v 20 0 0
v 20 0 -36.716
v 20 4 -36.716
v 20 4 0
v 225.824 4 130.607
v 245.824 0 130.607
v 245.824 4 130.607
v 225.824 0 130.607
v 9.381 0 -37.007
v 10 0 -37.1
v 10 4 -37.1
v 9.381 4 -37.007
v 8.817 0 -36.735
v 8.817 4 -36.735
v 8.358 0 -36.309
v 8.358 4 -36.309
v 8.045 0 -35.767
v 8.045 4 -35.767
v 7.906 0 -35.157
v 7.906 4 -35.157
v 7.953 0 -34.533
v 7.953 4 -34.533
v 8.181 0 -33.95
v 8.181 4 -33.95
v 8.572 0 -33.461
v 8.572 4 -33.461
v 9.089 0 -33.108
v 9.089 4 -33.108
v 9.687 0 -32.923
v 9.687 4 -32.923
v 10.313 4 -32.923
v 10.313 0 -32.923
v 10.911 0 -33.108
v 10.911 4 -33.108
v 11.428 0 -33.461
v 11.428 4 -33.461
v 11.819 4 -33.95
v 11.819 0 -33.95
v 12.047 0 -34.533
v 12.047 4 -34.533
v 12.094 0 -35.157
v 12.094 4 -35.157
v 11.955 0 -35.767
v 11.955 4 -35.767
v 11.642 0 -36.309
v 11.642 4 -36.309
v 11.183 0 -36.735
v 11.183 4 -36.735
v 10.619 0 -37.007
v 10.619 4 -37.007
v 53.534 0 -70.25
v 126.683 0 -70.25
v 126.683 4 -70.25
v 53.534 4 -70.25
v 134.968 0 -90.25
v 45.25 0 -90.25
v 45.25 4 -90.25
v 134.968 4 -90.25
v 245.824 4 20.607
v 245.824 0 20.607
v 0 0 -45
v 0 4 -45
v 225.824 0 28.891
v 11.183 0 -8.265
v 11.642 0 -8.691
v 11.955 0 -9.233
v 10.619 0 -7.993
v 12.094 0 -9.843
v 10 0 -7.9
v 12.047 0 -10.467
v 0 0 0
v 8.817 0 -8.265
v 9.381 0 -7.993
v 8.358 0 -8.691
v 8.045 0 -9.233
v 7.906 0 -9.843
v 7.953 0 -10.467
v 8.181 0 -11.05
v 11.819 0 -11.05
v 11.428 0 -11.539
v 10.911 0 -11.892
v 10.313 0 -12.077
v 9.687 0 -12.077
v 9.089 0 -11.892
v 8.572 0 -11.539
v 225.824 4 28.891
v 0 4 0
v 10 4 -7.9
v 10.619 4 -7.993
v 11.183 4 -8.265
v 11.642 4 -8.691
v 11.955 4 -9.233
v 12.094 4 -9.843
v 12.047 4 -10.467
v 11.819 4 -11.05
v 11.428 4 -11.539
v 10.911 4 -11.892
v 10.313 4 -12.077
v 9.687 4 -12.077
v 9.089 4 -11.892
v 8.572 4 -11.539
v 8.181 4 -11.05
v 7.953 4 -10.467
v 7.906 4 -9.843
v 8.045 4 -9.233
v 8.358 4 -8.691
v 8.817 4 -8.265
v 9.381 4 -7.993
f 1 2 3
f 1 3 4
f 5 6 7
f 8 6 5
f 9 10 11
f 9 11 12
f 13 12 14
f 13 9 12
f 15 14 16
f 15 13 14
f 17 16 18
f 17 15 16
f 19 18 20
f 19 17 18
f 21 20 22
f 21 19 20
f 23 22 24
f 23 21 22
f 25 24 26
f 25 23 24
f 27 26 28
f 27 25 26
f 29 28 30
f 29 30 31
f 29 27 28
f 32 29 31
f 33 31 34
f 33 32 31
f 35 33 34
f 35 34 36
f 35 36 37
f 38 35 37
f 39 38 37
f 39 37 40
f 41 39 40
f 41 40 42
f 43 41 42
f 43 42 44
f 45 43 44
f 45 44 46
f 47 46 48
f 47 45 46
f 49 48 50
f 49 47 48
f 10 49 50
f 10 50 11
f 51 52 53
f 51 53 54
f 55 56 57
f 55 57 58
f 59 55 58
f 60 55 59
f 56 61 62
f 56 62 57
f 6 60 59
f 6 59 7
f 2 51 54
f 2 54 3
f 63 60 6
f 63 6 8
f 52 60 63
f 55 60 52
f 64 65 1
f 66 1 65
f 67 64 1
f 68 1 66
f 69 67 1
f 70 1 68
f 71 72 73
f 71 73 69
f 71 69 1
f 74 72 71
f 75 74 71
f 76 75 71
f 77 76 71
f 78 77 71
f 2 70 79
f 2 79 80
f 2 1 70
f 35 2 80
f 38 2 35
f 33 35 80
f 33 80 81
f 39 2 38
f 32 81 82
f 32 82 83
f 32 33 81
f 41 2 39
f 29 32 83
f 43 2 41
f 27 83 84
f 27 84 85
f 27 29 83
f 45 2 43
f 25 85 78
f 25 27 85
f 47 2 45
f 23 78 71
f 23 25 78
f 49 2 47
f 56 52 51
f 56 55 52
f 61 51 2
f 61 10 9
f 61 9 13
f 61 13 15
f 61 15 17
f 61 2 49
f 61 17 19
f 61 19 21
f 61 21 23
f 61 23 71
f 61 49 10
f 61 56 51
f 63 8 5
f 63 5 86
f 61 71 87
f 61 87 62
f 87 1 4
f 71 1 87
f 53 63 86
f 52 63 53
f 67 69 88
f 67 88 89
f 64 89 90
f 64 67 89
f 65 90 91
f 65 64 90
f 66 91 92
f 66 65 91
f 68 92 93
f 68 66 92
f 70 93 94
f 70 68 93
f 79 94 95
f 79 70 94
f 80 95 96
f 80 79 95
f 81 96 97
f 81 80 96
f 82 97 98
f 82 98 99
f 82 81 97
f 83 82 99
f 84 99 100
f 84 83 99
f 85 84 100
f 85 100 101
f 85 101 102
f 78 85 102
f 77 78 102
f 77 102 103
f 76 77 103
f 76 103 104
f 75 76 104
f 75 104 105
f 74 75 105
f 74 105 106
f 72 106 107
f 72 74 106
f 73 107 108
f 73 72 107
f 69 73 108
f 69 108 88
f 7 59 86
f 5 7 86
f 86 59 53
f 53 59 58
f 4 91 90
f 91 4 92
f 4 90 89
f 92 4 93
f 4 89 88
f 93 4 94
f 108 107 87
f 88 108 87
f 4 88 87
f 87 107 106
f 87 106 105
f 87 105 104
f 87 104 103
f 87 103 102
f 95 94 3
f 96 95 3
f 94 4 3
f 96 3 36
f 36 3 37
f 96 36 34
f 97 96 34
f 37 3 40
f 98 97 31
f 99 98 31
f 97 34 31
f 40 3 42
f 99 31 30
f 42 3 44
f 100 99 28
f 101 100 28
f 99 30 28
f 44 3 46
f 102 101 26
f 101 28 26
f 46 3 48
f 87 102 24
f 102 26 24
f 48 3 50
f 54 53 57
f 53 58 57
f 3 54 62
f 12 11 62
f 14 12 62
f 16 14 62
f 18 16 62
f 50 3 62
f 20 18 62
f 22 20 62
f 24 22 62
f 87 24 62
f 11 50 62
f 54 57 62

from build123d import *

# Parameters (mm, degrees)
SKETCH_1_R      = 2.1
EXTRUDE_1_DEPTH = 4


with BuildPart() as part:
    # 草图1 → 凸台-拉伸1 (new body)
    with BuildSketch(Plane(origin=(0, 0, 0), x_dir=(1, 0, 0), z_dir=(0, 1, 0))):
        Polygon((20, 0), (0, 0), (0, 45), (45.25, 90.25), (134.96758269, 90.25), (245.824430246, -20.606847556), (245.824430246, -130.606847556), (225.824430246, -130.606847556), (225.824430246, -28.891118804), (126.683311442, 70.25), (53.534271247, 70.25), (20, 36.715728753), align=None)
        with Locations(Location((10, 10, 0), (0, 0, 270))):
            Circle(SKETCH_1_R, mode=Mode.SUBTRACT)
        with Locations(Location((10, 35, 0), (0, 0, 90))):
            Circle(SKETCH_1_R, mode=Mode.SUBTRACT)
    extrude(amount=EXTRUDE_1_DEPTH)


solid = part.part
